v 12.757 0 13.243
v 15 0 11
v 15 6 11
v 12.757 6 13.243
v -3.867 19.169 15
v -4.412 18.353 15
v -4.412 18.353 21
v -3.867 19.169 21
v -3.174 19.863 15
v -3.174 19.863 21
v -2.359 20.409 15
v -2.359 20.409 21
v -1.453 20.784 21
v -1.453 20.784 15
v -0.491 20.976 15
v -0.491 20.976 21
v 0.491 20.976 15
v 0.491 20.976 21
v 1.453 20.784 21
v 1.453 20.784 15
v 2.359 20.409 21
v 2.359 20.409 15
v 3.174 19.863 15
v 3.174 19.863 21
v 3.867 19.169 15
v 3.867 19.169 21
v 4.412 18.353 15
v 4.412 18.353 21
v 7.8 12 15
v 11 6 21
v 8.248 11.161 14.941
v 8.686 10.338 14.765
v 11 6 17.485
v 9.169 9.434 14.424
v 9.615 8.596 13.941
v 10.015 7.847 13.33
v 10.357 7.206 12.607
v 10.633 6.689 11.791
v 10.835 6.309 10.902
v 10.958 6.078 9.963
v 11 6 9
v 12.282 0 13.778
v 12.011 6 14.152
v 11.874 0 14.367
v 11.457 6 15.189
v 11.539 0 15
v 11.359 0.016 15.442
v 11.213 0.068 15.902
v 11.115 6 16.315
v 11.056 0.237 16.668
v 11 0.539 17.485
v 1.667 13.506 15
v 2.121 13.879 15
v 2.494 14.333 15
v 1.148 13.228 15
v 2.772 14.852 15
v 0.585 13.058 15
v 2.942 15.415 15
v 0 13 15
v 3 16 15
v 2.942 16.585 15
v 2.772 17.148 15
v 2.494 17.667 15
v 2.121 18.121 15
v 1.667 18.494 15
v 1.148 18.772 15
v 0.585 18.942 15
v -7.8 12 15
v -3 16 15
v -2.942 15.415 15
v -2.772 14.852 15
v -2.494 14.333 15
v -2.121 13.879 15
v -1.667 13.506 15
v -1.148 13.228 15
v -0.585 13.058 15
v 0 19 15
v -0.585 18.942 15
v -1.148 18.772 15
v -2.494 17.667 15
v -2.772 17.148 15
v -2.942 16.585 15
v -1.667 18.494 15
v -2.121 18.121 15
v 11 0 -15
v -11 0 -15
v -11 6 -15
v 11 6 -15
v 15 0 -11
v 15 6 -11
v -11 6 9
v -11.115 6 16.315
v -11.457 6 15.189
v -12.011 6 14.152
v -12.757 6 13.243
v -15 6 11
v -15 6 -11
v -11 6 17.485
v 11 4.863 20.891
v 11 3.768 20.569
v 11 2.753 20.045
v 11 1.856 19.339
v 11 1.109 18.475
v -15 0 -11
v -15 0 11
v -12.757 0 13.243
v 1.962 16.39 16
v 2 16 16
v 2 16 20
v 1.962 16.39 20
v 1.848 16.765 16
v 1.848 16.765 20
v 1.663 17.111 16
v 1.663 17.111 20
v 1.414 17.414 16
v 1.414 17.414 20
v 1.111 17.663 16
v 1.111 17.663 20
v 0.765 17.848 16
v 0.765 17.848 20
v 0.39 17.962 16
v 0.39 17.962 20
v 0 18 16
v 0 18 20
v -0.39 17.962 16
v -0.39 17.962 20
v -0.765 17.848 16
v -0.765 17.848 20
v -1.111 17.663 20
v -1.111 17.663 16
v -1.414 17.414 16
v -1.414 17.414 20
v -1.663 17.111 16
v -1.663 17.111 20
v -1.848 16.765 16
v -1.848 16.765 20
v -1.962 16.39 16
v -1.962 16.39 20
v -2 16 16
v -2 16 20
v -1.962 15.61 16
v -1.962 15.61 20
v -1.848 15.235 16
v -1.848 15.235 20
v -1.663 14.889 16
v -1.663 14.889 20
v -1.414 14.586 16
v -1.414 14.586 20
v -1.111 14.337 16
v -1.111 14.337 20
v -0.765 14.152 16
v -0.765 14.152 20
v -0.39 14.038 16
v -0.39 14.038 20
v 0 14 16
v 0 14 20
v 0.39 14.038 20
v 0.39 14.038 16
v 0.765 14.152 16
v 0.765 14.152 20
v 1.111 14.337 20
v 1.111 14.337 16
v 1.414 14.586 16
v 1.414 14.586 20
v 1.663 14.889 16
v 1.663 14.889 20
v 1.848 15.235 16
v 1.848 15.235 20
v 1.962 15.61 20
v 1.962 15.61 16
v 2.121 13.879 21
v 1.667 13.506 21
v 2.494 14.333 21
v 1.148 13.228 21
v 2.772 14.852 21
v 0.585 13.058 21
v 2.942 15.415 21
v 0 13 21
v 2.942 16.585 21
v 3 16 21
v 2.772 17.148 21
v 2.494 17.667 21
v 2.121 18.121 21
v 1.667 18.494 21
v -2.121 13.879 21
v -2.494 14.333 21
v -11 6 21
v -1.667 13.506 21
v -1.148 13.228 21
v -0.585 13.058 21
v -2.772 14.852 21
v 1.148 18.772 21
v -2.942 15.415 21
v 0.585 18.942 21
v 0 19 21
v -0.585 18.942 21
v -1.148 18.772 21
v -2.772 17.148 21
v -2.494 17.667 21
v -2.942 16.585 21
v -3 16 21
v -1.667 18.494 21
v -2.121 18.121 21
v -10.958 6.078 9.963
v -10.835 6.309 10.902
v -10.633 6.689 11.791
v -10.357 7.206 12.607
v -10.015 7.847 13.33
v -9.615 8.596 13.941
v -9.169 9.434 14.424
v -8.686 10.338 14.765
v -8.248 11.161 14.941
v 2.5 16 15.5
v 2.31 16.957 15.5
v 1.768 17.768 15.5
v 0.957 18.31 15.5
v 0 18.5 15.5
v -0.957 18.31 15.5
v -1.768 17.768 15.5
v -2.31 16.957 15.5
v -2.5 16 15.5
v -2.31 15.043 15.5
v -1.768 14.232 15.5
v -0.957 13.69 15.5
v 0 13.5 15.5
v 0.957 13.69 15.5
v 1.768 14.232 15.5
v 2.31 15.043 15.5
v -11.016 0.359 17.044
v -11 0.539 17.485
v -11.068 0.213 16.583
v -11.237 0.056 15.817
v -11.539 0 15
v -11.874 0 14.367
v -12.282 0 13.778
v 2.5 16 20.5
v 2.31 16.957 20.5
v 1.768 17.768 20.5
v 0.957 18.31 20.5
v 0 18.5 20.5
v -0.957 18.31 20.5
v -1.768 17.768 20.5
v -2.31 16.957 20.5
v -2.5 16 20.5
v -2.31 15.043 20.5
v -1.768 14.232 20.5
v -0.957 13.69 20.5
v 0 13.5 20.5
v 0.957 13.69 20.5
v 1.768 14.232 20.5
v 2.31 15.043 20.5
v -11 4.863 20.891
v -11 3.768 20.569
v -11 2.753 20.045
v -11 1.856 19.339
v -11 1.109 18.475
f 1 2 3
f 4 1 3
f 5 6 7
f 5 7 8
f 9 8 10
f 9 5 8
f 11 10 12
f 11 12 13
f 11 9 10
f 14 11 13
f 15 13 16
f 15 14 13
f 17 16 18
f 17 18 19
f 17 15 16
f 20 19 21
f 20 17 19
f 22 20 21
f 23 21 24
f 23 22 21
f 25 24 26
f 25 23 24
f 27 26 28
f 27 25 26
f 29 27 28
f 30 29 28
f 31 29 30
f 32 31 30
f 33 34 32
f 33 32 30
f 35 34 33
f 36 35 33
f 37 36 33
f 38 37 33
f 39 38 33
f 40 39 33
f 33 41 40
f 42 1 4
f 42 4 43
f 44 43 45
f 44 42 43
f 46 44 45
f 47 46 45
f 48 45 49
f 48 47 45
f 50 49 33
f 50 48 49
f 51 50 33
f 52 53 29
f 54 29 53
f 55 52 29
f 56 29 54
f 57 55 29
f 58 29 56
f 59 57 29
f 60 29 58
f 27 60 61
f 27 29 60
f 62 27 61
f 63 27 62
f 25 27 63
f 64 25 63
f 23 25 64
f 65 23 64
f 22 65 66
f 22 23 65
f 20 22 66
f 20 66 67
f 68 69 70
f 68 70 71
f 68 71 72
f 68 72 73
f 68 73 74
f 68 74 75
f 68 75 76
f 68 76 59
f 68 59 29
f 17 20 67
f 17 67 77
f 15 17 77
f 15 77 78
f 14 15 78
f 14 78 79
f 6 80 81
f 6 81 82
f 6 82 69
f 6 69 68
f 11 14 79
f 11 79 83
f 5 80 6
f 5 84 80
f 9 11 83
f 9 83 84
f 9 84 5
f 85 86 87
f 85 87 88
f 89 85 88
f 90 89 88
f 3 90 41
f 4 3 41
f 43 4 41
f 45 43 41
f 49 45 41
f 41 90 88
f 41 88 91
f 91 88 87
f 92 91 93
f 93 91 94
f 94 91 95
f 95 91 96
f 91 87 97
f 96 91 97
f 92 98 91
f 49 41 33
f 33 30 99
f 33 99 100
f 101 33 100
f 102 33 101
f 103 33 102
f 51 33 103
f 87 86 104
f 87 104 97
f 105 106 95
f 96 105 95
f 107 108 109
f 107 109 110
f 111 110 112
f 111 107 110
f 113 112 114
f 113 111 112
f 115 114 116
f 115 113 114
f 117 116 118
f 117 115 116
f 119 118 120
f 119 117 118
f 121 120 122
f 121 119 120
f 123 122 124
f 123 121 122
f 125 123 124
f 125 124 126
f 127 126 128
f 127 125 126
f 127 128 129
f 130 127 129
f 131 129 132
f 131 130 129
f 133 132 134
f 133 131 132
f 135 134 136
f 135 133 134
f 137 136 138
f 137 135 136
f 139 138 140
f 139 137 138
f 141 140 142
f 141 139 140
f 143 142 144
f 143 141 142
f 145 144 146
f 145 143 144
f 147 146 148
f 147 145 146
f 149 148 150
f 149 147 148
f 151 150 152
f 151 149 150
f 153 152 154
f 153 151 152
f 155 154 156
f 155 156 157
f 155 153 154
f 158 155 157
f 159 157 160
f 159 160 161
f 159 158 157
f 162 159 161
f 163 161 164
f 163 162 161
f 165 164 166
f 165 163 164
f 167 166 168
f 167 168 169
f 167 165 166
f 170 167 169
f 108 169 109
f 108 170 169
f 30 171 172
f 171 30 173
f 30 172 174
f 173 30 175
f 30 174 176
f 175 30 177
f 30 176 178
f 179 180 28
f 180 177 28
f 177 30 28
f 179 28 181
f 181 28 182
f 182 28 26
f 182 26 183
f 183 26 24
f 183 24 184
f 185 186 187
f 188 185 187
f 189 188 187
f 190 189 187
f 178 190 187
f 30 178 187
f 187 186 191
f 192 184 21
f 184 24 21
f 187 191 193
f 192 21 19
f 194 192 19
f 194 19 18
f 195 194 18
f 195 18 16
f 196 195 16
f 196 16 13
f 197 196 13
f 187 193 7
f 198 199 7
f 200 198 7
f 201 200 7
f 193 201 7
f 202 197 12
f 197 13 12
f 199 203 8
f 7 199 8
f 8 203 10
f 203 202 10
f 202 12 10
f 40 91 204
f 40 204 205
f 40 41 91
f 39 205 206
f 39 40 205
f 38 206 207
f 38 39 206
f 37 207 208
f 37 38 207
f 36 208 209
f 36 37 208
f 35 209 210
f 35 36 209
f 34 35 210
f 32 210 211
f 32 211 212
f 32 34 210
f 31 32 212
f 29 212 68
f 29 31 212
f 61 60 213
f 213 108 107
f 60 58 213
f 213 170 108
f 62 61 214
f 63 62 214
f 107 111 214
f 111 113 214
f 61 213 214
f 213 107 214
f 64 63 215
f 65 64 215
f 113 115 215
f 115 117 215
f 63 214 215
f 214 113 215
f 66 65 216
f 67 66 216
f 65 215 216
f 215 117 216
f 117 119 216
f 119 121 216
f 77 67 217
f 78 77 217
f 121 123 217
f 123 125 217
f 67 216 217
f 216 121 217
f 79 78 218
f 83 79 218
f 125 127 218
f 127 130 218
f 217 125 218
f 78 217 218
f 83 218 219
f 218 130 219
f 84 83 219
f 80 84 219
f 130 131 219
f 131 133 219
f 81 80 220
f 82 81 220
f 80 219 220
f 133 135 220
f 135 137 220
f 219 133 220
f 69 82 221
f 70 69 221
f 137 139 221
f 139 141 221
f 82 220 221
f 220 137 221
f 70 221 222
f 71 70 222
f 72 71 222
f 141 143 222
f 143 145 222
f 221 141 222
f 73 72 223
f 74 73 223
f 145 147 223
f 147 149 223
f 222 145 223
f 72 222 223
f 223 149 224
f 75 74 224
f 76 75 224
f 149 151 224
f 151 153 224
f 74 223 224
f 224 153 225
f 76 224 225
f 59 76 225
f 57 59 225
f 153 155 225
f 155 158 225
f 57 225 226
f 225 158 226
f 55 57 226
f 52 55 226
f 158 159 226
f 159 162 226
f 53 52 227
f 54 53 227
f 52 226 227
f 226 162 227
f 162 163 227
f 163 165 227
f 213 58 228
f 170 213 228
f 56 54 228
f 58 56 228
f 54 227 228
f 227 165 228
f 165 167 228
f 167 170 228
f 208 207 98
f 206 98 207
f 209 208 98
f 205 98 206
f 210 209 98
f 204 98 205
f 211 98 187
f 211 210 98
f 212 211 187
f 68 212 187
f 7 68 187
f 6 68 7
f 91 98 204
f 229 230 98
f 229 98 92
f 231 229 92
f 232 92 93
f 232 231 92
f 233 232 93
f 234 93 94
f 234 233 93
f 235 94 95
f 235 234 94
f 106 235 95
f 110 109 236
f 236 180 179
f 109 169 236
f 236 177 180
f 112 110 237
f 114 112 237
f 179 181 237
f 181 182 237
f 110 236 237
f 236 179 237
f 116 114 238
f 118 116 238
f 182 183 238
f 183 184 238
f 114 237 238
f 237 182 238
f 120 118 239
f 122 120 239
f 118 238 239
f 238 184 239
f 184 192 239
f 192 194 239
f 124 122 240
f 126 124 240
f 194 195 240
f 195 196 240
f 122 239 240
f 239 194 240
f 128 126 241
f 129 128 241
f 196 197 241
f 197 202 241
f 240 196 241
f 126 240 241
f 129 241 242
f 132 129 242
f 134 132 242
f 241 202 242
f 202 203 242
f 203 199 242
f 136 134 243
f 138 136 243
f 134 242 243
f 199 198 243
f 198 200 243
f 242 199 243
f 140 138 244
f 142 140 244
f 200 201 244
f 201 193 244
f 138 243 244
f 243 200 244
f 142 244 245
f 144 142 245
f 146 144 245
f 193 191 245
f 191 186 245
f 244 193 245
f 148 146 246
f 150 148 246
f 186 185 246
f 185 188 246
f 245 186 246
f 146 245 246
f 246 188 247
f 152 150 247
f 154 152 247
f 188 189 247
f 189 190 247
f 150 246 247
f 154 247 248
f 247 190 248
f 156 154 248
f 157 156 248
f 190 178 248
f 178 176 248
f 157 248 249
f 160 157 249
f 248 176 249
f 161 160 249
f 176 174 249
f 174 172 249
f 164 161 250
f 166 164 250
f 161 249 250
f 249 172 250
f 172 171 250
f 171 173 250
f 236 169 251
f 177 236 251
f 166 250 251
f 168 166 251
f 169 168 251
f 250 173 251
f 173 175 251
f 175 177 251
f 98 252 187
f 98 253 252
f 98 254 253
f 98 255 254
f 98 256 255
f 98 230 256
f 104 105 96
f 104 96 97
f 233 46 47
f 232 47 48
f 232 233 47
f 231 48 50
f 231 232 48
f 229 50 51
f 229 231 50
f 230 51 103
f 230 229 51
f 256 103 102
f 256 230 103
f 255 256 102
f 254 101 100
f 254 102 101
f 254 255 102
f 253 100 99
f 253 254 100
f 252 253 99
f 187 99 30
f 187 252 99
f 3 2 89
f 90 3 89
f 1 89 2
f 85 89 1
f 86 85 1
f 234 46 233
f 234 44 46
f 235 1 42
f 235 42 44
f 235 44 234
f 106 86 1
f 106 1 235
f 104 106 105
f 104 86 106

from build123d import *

# Parameters (mm, degrees)
SKETCH_1_W      = 30
SKETCH_1_H      = 30
EXTRUDE_1_DEPTH = 6
CHAMFER_1_SIZE  = 4
SKETCH_2_R      = 2
EXTRUDE_2_DEPTH = 6
FILLET_1_R      = 6
FILLET_2_R      = 6
FILLET_3_R      = 6
CHAMFER_2_SIZE  = 1


with BuildPart() as part:
    # 草图1 → 凸台-拉伸1 (new body)
    with BuildSketch(Plane(origin=(0, 0, 0), x_dir=(1, 0, 0), z_dir=(0, 1, 0))):
        Rectangle(SKETCH_1_W, SKETCH_1_H)
    extrude(amount=EXTRUDE_1_DEPTH)

    # 倒角1
    chamfer_1_edges = [part.edges().sort_by_distance(p)[0] for p in [
        (15, 3, 15),
        (-15, 3, 15),
        (-15, 3, -15),
        (15, 3, -15),
    ]]
    chamfer(chamfer_1_edges, length=CHAMFER_1_SIZE)

    # 草图2 → 凸台-拉伸2 (add)
    with BuildSketch(Plane.XY.offset(15)):
        with BuildLine():
            Line((-11, 6), (-4.411764706, 18.352941176))
            ThreePointArc((-4.411764706, 18.352941176), (0, 21), (4.411764706, 18.352941176))
            Line((4.411764706, 18.352941176), (11, 6))
            Line((11, 6), (11, 0))
            Line((11, 0), (-11, 0))
            Line((-11, 0), (-11, 6))
        make_face()
        with Locations((0, 16)):
            Circle(SKETCH_2_R, mode=Mode.SUBTRACT)
    extrude(amount=EXTRUDE_2_DEPTH)

    # 圆角1
    fillet_1_edges = [part.edges().sort_by_distance(p)[0] for p in [
        (0, 0, 21),
    ]]
    fillet(fillet_1_edges, radius=FILLET_1_R)

    # 圆角2
    # the kernel refuses this fillet: 6 mm, written as the material it adds along each edge
    with BuildSketch(Plane(origin=(-11, 0, 15), x_dir=(-0.7071067811865481, 0, -0.7071067811865467), z_dir=(0, 1, 0))) as fillet_2_piece_1_section:
        with BuildLine():
            CenterArc((FILLET_2_R * 0.414213562373, FILLET_2_R), FILLET_2_R, 225, 45)
            Line((-FILLET_2_R * 0.292893218813, FILLET_2_R * 0.292893218813), (0, 0))
            Line((0, 0), (FILLET_2_R * 0.414213562373, 0))
        make_face()
    fillet_2_piece_1 = extrude(amount=6, mode=Mode.PRIVATE)
    fillet_2_piece_1 = split(fillet_2_piece_1, bisect_by=Plane(origin=(-11.980240057, 0.038623377, 15), z_dir=(0, 0, -1)), keep=Keep.TOP, mode=Mode.PRIVATE)
    add(fillet_2_piece_1)
    with BuildSketch(Plane(origin=(-11, -6.213203436, 15), x_dir=(-0.7071067811865482, 0, -0.7071067811865468), z_dir=(0, 1, 0))) as fillet_2_piece_2_section:
        with BuildLine():
            CenterArc((FILLET_2_R * 0.414213562373, FILLET_2_R), FILLET_2_R, 225, 45)
            Line((-FILLET_2_R * 0.292893218813, FILLET_2_R * 0.292893218813), (0, 0))
            Line((0, 0), (FILLET_2_R * 0.414213562373, 0))
        make_face()
    fillet_2_piece_2 = extrude(amount=12.213203436, mode=Mode.PRIVATE)
    fillet_2_piece_2 = fillet_2_piece_2 & Plane(origin=(-11.156065336, 6, 15), x_dir=(0, -1, 0), z_dir=(-1, 0, 0)) * Cylinder(6, 35, mode=Mode.PRIVATE)
    add(fillet_2_piece_2)
    with BuildSketch(Plane(origin=(11, 0, 15), x_dir=(0.7071067811865482, 0, -0.7071067811865468), z_dir=(0, 1, 0))) as fillet_2_piece_3_section:
        with BuildLine():
            CenterArc((FILLET_2_R * 0.414213562373, -FILLET_2_R), FILLET_2_R, 90, 45)
            Line((-FILLET_2_R * 0.292893218813, -FILLET_2_R * 0.292893218813), (0, 0))
            Line((0, 0), (FILLET_2_R * 0.414213562373, 0))
        make_face()
    fillet_2_piece_3 = extrude(amount=6, mode=Mode.PRIVATE)
    fillet_2_piece_3 = split(fillet_2_piece_3, bisect_by=Plane(origin=(11.980240057, 0.038623377, 15), z_dir=(0, 0, -1)), keep=Keep.TOP, mode=Mode.PRIVATE)
    add(fillet_2_piece_3)
    with BuildSketch(Plane(origin=(11, -6.213203436, 15), x_dir=(0.7071067811865476, 0, -0.7071067811865476), z_dir=(0, 1, 0))) as fillet_2_piece_4_section:
        with BuildLine():
            CenterArc((FILLET_2_R * 0.414213562373, -FILLET_2_R), FILLET_2_R, 90, 45)
            Line((-FILLET_2_R * 0.292893218813, -FILLET_2_R * 0.292893218813), (0, 0))
            Line((0, 0), (FILLET_2_R * 0.414213562373, 0))
        make_face()
    fillet_2_piece_4 = extrude(amount=12.213203436, mode=Mode.PRIVATE)
    fillet_2_piece_4 = fillet_2_piece_4 & Plane(origin=(11.156065336, 6, 15), x_dir=(0, -1, 0), z_dir=(-1, 0, 0)) * Cylinder(6, 35, mode=Mode.PRIVATE)
    add(fillet_2_piece_4)

    # 圆角3
    fillet_3_edges = [part.edges().sort_by_distance(p)[0] for p in [
        (0, 6, 15),
    ]]
    fillet(fillet_3_edges, radius=FILLET_3_R)

    # 倒角2
    chamfer_2_edges = [part.edges().sort_by_distance(p)[0] for p in [
        (-2, 16, 15),
        (-2, 16, 21),
    ]]
    chamfer(chamfer_2_edges, length=CHAMFER_2_SIZE)


solid = part.part
